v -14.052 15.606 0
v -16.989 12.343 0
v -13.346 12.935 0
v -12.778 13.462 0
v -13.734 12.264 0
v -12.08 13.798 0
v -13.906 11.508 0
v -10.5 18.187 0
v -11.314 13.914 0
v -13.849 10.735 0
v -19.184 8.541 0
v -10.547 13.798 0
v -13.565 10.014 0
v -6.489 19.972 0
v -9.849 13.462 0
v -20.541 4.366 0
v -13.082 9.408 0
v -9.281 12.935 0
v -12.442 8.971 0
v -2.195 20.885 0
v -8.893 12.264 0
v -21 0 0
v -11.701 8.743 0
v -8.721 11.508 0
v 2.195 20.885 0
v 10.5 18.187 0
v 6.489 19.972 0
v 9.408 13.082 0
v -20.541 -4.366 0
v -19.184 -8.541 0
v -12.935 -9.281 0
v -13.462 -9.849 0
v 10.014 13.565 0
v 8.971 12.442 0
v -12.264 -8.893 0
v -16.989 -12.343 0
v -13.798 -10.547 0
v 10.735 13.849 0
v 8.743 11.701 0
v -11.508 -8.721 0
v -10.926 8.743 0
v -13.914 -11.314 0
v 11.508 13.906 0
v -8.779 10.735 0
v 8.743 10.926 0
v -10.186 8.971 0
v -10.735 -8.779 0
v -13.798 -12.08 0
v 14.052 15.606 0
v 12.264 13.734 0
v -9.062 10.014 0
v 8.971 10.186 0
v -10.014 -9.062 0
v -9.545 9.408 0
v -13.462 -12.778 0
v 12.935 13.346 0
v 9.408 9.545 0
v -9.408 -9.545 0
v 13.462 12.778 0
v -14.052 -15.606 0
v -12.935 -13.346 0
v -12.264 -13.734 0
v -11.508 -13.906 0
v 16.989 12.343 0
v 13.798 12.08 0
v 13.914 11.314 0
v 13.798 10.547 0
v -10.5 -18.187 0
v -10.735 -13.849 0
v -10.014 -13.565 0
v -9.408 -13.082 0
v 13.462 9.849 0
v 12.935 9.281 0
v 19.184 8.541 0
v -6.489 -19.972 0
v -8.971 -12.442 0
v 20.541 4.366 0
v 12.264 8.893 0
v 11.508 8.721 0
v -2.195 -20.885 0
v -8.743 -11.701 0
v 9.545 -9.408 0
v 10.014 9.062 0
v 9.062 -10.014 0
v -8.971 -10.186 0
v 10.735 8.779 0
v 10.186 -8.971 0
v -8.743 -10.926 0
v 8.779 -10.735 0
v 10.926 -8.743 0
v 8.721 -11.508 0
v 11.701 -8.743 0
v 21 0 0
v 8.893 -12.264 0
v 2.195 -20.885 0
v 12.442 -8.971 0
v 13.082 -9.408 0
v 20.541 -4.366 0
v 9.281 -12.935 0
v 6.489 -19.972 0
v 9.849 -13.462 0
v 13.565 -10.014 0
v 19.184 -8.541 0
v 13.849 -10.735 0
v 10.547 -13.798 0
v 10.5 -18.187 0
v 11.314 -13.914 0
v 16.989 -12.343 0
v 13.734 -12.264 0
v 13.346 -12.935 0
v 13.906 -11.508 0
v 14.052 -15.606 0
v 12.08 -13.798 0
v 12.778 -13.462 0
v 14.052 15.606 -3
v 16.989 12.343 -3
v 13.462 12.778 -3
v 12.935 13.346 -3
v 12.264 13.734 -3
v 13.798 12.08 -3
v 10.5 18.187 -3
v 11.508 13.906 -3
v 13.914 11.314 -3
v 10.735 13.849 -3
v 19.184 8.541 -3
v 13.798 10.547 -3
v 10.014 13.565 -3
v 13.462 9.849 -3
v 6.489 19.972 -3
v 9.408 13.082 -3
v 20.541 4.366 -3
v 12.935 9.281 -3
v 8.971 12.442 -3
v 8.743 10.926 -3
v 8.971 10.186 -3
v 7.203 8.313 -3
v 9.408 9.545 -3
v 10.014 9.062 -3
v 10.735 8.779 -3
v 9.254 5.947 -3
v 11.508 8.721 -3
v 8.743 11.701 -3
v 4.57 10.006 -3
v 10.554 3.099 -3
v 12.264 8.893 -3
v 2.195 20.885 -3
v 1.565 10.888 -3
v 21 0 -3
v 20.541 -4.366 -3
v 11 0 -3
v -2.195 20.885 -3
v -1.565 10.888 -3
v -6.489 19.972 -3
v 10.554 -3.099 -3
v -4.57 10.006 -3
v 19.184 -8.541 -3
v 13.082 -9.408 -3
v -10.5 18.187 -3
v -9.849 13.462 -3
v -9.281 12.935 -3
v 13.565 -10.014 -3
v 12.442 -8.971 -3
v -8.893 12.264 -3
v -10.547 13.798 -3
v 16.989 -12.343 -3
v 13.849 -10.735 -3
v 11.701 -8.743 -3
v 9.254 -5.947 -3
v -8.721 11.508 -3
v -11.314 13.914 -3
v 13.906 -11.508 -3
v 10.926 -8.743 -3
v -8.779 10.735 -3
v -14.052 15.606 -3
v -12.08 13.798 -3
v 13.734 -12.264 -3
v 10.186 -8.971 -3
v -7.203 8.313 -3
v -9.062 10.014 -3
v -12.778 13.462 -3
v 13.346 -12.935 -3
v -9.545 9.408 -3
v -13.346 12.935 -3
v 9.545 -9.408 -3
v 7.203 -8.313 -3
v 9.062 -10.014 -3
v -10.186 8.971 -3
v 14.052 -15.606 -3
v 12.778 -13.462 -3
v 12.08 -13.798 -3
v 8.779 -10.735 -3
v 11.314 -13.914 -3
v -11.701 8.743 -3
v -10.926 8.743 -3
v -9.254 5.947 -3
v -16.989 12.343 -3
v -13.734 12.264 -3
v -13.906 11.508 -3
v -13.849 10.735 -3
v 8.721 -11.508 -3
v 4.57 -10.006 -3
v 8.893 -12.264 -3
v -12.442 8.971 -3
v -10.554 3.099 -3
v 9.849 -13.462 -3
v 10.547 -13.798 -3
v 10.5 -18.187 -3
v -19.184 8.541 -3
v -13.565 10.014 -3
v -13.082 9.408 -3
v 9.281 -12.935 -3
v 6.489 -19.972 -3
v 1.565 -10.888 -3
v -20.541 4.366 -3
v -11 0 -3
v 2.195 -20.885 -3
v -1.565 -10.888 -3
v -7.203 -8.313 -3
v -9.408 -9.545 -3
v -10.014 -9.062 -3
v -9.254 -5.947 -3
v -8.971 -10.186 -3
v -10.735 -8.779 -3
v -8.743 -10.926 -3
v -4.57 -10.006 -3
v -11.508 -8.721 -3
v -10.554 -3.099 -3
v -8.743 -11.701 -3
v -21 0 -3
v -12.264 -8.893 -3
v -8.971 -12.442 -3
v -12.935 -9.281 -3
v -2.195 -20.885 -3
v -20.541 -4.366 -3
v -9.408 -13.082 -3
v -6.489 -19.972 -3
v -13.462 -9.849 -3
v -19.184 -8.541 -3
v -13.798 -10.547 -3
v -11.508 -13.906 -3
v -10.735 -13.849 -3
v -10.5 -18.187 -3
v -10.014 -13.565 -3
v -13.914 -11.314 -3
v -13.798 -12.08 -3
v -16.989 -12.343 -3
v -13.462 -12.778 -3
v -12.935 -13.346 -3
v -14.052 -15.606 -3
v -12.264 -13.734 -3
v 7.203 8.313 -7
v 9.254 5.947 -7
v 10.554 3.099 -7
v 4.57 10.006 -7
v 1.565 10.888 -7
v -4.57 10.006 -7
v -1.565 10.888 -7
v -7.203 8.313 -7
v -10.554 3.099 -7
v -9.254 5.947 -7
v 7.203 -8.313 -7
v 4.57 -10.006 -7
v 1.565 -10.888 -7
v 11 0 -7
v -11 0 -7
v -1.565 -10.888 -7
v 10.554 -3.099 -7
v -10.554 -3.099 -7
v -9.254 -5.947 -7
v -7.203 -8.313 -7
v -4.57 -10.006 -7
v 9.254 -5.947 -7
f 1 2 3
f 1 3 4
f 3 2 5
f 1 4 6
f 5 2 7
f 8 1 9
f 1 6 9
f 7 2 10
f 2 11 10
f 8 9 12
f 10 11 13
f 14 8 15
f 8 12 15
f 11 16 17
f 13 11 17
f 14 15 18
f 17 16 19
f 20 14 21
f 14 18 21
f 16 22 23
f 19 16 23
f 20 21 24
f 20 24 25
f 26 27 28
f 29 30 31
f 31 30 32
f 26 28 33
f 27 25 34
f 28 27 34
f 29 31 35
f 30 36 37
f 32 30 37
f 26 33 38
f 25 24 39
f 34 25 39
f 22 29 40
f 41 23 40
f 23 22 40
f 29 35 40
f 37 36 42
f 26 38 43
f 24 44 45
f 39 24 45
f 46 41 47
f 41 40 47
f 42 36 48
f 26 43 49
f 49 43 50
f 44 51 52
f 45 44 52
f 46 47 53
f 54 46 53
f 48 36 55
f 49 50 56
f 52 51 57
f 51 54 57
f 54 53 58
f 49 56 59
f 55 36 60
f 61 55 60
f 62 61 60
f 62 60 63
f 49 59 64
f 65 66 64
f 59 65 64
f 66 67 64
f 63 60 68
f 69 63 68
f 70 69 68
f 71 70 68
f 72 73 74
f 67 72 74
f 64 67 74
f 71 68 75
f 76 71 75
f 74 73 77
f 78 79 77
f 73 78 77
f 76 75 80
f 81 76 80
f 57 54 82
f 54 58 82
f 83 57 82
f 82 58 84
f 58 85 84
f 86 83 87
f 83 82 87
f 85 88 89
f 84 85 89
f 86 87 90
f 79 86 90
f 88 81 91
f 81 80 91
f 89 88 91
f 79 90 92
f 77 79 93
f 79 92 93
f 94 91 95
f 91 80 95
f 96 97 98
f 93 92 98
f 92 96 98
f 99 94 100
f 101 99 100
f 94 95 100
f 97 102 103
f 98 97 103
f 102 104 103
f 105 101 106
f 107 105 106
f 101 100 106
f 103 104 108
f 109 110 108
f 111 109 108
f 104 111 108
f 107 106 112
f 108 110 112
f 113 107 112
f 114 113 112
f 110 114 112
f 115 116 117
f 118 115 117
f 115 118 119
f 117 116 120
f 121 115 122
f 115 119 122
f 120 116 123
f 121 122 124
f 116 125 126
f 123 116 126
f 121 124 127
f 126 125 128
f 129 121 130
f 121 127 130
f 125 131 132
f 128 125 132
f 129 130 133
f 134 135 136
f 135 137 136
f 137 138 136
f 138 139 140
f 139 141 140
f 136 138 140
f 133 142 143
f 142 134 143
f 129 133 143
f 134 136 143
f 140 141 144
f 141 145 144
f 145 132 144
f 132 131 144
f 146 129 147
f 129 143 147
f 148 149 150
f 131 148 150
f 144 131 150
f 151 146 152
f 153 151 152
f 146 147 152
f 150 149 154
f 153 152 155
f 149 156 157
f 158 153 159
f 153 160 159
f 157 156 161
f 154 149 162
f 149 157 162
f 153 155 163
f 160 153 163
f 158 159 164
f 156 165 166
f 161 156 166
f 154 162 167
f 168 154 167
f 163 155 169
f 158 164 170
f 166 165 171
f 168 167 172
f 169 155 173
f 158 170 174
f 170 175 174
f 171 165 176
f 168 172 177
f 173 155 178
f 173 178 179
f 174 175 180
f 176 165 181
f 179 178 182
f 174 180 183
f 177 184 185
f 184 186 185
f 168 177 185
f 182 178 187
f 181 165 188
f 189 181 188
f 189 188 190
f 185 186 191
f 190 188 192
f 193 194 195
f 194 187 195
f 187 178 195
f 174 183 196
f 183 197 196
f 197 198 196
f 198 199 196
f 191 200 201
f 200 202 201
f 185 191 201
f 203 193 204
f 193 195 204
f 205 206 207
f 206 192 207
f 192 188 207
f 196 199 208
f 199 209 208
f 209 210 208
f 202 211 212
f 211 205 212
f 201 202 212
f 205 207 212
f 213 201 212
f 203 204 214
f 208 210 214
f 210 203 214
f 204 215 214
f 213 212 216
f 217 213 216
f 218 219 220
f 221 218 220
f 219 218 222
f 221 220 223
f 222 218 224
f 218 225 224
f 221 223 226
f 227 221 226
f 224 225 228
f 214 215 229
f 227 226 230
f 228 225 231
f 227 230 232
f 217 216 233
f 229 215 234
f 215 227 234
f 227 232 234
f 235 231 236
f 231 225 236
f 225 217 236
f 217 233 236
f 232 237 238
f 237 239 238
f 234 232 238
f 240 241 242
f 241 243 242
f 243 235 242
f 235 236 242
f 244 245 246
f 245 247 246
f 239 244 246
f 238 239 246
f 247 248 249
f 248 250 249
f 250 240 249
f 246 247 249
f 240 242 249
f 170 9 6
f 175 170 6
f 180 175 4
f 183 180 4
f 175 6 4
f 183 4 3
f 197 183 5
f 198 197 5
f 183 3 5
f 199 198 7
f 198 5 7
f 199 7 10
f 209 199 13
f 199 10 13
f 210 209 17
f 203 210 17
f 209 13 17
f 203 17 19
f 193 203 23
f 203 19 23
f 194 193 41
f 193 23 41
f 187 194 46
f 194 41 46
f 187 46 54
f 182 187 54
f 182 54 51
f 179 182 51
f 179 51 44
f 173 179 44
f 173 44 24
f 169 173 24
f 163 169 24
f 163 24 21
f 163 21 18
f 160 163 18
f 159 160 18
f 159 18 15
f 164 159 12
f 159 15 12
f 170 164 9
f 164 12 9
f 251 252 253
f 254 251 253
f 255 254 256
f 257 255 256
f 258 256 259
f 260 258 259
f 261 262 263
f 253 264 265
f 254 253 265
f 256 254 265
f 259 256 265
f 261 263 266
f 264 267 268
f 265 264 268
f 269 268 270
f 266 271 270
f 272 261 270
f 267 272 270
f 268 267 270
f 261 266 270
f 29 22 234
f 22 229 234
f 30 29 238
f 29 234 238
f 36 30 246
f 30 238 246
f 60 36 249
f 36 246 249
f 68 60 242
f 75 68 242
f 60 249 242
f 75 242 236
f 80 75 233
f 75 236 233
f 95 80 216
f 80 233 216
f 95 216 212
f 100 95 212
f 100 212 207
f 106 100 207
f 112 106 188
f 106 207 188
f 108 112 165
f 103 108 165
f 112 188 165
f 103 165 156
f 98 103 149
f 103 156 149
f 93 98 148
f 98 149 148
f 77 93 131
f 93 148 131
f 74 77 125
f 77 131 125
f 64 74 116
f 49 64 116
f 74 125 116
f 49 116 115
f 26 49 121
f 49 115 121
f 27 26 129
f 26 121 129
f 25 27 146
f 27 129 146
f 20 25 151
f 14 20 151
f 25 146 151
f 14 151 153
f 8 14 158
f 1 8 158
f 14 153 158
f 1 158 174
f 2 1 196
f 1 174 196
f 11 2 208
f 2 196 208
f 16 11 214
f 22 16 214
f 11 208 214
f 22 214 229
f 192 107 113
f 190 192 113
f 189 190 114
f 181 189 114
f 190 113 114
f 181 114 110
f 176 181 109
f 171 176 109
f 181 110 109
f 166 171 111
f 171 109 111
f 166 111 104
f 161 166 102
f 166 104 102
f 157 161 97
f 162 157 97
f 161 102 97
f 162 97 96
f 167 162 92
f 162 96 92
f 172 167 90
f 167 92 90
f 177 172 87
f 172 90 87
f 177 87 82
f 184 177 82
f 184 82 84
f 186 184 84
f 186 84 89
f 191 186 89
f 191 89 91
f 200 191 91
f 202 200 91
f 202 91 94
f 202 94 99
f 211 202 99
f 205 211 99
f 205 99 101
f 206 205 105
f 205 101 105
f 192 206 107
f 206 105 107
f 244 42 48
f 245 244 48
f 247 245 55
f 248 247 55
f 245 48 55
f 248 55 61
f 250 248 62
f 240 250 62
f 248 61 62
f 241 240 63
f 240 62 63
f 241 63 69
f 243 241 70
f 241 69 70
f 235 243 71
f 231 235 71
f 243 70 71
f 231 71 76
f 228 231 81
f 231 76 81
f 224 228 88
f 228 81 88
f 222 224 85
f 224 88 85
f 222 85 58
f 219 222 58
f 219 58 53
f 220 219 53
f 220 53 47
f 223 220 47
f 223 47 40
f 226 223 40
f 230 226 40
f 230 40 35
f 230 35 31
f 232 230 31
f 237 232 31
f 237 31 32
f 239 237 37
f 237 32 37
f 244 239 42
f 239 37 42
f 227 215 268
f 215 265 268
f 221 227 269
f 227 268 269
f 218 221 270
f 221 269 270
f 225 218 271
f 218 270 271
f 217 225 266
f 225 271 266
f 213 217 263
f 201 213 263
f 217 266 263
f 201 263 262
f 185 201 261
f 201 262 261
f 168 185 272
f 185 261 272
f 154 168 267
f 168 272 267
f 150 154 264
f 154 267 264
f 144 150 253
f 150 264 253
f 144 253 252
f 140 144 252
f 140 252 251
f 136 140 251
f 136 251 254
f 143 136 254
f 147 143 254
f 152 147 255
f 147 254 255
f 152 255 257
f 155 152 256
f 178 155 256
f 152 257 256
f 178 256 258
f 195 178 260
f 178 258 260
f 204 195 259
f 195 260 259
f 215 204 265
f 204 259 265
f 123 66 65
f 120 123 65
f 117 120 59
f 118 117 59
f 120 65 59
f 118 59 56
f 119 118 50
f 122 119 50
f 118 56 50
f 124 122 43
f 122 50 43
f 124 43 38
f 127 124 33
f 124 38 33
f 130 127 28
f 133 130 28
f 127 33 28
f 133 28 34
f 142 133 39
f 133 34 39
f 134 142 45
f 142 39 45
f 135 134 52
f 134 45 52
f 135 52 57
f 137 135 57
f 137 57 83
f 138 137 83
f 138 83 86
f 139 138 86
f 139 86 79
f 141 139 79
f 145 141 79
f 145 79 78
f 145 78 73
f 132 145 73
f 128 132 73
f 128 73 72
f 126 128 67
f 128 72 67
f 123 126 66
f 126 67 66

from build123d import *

# Parameters (mm, degrees)
SKETCH_2_R               = 2.6
CUT_EXTRUDE_1_DEPTH      = 3
PATTERN_CIRCULAR_1_COUNT = 4


with BuildPart() as part:
    # Эскиз1 → Повернуть1 (revolve)
    with BuildSketch(Plane(origin=(0, 0, 0), x_dir=(1, 0, 0), z_dir=(0, 1, 0))):
        Polygon((0, 0), (-21, 0), (-21, 3), (-11, 3), (-11, 7), (0, 7), align=None)
    revolve(axis=Axis((0, 0, -7), (0, 0, 1)))

    # Эскиз2 → Вырез-Вытянуть1 (cut)
    with BuildSketch(Plane.XY):
        with Locations((11.313708499, 11.313708499)):
            Circle(SKETCH_2_R)
    cut_extrude_1 = extrude(amount=-CUT_EXTRUDE_1_DEPTH, mode=Mode.SUBTRACT)

    # Круговой массив1: Вырез-Вытянуть1 ×4 about axis
    pattern_circular_1_axis = Axis((0, 0, 0), (0, 0, 1))
    for i in range(1, PATTERN_CIRCULAR_1_COUNT):
        add(cut_extrude_1.rotate(pattern_circular_1_axis, i * 360 / PATTERN_CIRCULAR_1_COUNT), mode=Mode.SUBTRACT)


solid = part.part
